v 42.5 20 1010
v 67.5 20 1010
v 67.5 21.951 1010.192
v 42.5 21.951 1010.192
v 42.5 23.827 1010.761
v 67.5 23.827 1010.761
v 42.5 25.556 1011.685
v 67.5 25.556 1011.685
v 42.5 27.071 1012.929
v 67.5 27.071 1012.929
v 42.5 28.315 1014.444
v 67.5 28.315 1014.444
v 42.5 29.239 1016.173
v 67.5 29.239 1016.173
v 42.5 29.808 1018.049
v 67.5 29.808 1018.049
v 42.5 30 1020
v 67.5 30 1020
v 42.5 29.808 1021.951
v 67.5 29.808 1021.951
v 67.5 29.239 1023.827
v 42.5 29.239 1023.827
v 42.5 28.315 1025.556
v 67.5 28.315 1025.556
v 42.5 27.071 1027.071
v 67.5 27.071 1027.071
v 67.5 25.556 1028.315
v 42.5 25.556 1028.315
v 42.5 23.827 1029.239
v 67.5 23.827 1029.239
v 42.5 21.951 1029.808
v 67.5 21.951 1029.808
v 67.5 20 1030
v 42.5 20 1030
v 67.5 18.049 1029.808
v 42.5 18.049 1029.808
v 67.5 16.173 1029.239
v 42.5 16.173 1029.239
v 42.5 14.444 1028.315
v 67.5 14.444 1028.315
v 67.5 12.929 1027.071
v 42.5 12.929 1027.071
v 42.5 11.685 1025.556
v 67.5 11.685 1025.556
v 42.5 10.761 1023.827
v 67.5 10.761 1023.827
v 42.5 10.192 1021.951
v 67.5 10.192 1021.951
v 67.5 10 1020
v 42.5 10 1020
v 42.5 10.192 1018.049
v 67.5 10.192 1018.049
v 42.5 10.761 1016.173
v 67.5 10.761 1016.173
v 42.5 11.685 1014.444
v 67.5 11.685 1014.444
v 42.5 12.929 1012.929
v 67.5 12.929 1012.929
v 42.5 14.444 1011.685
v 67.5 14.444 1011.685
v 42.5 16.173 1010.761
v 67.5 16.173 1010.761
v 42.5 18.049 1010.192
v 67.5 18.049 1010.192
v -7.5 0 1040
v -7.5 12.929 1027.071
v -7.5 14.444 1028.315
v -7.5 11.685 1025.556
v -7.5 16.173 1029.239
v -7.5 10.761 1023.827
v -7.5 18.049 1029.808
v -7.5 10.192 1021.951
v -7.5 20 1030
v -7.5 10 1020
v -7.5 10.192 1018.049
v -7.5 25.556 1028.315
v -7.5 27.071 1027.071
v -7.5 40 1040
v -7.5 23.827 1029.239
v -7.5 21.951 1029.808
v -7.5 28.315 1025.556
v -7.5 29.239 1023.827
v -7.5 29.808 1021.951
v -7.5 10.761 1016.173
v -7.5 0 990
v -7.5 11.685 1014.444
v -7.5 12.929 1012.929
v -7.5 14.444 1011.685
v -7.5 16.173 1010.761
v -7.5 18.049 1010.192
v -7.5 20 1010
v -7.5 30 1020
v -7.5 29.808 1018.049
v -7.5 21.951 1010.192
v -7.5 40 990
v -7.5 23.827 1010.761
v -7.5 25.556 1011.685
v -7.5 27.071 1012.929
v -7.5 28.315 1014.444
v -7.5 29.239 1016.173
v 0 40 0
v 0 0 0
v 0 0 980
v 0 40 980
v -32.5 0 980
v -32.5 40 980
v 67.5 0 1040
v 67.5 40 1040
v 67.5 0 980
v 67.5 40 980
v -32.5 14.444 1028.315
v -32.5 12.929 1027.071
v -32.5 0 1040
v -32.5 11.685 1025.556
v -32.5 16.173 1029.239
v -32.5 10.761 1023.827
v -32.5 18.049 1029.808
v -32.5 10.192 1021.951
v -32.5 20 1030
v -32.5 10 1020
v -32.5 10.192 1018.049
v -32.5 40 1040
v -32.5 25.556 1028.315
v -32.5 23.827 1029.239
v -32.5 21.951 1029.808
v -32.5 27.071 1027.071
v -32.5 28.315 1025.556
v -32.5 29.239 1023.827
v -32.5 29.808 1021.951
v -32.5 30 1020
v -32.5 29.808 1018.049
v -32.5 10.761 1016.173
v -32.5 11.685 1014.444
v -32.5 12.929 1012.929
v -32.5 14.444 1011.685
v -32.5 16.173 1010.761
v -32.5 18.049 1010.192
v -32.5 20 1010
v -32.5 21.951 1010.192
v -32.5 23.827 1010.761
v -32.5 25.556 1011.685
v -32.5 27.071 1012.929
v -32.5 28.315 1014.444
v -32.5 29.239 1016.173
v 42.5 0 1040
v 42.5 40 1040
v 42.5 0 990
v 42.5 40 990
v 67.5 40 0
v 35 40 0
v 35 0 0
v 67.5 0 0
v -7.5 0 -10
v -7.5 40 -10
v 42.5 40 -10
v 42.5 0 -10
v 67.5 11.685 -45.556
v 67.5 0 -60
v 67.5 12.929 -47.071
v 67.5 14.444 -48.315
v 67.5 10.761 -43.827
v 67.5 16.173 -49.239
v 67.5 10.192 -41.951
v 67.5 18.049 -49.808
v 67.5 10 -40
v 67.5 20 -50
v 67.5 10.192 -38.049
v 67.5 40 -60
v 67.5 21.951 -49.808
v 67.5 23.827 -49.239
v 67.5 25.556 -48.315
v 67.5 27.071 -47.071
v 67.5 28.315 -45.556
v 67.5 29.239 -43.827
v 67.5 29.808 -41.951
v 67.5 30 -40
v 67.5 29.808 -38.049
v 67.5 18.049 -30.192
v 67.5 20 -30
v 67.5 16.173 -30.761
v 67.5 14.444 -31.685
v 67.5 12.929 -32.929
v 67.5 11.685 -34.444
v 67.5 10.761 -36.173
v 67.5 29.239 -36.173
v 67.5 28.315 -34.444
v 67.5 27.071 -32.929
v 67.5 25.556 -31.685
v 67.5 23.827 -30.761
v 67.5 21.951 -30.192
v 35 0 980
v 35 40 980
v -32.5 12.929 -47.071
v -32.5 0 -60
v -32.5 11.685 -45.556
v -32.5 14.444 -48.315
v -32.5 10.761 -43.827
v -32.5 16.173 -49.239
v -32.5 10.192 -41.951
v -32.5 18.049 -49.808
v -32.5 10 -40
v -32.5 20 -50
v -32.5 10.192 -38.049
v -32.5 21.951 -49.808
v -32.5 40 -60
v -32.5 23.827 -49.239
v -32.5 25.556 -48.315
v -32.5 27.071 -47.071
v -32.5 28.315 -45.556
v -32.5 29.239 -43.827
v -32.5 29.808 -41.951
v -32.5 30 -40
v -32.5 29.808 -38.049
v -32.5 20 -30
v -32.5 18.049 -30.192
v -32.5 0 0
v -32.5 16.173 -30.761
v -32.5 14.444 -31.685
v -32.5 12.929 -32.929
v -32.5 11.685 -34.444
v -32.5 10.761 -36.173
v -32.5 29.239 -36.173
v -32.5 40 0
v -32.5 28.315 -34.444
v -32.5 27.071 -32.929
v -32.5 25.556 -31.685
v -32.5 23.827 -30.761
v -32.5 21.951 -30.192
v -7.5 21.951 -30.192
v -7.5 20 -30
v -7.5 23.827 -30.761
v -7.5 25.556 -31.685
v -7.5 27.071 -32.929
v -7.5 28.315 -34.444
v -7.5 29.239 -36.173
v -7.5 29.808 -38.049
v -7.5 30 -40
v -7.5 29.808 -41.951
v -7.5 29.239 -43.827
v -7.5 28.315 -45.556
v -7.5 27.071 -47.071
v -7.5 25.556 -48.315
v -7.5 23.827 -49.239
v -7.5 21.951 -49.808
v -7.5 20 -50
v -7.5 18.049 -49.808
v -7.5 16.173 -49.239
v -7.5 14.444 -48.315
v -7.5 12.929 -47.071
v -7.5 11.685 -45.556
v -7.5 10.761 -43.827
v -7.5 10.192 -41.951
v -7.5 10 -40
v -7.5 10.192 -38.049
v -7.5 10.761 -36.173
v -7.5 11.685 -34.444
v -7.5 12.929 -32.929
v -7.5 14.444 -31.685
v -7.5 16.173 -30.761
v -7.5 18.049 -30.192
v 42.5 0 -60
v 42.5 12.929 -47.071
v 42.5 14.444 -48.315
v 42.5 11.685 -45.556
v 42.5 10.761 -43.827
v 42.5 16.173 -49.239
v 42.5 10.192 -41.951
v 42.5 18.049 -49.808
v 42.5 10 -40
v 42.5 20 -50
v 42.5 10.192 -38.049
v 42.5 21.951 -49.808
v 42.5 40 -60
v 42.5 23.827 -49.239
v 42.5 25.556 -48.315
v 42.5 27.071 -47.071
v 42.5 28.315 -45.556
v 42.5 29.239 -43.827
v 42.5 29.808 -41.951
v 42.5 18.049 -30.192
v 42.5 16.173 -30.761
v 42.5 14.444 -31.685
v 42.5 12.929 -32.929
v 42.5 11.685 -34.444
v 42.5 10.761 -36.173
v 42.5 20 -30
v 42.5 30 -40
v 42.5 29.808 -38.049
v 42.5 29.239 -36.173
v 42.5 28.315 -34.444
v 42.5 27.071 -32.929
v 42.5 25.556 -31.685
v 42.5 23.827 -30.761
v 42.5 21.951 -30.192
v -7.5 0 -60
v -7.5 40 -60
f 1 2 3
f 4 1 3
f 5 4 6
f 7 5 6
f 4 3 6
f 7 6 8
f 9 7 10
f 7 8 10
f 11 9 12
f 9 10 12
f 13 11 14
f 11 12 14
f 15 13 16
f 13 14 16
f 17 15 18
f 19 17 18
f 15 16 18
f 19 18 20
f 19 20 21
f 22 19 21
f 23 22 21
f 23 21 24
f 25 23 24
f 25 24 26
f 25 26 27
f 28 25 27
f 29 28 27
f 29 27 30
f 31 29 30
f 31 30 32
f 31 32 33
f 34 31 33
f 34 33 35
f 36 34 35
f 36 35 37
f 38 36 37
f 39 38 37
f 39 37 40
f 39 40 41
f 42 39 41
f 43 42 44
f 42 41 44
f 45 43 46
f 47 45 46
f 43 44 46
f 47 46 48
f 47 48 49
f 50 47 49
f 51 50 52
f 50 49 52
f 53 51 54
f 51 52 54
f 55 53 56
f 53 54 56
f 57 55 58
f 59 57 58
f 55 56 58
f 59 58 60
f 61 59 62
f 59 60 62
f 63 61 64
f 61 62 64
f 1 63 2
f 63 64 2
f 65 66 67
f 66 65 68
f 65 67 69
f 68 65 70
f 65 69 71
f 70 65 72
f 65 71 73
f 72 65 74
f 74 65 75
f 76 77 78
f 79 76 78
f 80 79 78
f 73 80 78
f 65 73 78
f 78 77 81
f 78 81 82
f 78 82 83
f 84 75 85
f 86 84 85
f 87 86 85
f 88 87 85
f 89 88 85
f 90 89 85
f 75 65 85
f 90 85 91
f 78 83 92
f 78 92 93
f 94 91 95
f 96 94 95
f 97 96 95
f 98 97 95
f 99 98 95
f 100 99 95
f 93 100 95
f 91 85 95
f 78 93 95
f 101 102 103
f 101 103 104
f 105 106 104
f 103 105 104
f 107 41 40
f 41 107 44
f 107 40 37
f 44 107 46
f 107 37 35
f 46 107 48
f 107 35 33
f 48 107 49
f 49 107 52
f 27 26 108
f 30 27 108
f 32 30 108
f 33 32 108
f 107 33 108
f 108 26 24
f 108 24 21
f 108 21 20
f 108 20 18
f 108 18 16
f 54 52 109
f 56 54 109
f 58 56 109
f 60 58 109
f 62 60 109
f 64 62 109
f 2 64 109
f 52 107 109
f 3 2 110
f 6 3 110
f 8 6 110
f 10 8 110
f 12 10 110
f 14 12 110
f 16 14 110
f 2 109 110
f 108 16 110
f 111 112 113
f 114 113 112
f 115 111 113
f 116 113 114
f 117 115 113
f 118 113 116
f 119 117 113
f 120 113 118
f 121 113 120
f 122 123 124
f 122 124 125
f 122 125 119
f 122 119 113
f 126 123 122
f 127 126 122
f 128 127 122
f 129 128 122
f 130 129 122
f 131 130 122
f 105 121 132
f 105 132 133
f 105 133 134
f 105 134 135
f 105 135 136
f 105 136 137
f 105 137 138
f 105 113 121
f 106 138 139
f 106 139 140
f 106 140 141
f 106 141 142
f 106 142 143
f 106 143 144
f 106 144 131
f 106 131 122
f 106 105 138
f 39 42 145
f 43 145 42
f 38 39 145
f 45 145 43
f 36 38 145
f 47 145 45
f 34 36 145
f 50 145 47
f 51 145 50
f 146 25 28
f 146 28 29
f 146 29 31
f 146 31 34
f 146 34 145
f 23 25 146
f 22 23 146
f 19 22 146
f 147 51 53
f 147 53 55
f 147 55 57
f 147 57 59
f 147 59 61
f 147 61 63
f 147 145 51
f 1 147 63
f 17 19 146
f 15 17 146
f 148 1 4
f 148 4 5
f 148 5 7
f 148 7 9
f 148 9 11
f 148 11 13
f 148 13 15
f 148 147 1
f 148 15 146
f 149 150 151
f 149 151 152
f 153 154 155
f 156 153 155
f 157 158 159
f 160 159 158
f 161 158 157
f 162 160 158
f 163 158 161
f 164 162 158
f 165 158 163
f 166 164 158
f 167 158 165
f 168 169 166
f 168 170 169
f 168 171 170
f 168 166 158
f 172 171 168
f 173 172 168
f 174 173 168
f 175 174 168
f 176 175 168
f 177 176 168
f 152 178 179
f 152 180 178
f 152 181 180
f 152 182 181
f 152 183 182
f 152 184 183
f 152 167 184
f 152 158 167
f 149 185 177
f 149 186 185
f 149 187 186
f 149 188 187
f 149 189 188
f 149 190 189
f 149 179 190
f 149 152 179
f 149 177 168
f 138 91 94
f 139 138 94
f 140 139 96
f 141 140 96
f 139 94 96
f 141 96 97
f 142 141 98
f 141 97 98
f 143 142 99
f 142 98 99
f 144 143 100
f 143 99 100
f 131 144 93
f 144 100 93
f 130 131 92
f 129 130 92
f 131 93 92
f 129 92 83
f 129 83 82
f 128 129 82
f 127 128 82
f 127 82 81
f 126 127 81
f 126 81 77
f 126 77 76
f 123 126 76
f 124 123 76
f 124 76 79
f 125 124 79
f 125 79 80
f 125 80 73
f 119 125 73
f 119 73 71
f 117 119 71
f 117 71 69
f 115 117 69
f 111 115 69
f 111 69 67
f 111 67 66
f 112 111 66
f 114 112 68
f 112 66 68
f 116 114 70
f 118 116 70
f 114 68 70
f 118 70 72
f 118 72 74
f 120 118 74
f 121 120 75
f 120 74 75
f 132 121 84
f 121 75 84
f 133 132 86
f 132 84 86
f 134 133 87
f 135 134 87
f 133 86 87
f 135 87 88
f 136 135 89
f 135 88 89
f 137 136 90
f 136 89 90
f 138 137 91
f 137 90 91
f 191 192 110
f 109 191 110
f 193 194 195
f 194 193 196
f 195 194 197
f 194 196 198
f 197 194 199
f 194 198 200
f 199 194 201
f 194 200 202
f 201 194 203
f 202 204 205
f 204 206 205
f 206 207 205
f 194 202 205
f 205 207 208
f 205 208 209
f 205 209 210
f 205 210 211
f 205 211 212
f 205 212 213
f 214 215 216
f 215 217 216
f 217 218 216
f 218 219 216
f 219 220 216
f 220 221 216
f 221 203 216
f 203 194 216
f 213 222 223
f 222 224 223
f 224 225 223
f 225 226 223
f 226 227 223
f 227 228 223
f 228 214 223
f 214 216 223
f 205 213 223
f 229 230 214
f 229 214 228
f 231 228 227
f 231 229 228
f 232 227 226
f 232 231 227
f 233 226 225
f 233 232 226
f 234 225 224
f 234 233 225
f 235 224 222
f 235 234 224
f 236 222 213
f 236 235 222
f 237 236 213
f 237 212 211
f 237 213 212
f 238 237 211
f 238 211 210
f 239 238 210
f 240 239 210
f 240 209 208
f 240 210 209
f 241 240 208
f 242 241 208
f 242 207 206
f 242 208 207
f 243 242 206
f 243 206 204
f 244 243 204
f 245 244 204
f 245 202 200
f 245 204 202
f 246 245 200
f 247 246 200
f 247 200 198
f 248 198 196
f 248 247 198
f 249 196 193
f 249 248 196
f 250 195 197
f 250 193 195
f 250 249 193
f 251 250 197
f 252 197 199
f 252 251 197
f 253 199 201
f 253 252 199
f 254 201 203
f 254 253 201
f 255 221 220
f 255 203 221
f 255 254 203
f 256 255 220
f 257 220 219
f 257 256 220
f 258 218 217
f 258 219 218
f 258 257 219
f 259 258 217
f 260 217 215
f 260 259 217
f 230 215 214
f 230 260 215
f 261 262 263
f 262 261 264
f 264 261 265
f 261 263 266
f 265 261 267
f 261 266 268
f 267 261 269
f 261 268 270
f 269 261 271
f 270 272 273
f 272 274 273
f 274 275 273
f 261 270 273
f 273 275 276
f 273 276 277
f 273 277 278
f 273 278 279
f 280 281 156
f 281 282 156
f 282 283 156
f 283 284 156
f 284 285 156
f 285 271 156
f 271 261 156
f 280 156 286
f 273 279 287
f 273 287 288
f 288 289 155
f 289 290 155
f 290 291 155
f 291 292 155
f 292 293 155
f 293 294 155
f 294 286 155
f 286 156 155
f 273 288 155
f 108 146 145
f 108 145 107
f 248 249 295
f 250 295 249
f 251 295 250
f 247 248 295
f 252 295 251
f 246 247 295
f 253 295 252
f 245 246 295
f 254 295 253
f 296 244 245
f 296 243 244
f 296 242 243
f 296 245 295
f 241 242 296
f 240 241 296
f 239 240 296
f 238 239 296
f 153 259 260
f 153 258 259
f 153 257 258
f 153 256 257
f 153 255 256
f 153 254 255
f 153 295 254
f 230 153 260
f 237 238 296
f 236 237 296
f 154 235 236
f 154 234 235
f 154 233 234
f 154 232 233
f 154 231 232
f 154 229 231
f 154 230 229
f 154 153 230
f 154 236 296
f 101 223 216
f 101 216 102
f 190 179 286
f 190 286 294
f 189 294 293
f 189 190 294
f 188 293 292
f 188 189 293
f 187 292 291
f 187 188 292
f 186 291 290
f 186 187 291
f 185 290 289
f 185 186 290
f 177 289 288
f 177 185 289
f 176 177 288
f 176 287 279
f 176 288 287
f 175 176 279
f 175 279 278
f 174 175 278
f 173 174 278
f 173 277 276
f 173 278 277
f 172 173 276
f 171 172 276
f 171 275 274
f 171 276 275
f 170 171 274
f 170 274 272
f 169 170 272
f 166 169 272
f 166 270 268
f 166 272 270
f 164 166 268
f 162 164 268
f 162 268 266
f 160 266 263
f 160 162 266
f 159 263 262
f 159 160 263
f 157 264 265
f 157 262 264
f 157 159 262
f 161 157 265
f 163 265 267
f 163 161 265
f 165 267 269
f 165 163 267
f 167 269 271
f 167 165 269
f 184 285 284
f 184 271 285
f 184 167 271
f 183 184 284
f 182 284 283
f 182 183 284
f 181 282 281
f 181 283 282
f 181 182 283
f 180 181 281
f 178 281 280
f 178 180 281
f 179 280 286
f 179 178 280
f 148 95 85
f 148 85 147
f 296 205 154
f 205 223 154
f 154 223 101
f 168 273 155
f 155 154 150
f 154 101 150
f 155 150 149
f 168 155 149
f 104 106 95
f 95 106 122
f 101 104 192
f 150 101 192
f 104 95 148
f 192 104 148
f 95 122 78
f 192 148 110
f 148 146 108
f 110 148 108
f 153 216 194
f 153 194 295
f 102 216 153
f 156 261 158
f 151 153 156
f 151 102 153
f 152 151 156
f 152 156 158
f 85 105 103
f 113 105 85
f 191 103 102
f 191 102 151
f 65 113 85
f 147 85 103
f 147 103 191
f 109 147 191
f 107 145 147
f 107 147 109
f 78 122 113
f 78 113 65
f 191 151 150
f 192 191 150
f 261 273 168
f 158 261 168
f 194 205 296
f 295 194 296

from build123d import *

# Parameters (mm, degrees)
SZKIC1_W                    = 35
SZKIC1_H                    = 40
DODANIE_WYCI_GNI_CIE1_DEPTH = 980
SZKIC2_W                    = 100
SZKIC2_H                    = 40
DODANIE_WYCI_GNI_CIE2_DEPTH = 10
SZKIC3_W                    = 25
SZKIC3_H                    = 40
DODANIE_WYCI_GNI_CIE3_DEPTH = 50
SZKIC4_R                    = 10
WYTNIJ_WYCI_GNI_CIE3_DEPTH  = 1060.811303959


with BuildPart() as part:
    # Szkic1 → Dodanie-wyciągnięcie1 (new body)
    with BuildSketch(Plane.XY):
        with Locations((17.5, 20)):
            Rectangle(SZKIC1_W, SZKIC1_H)
    extrude(amount=DODANIE_WYCI_GNI_CIE1_DEPTH)

    # Szkic2 → Dodanie-wyciągnięcie2 (add)
    with BuildSketch(Plane.XY.offset(980)):
        with Locations((17.5, 20)):
            Rectangle(SZKIC2_W, SZKIC2_H)
    dodanie_wyci_gni_cie2 = extrude(amount=DODANIE_WYCI_GNI_CIE2_DEPTH)

    # Szkic3 → Dodanie-wyciągnięcie3 (add)
    with BuildSketch(Plane.XY.offset(990)):
        with Locations((-20, 20)):
            Rectangle(SZKIC3_W, SZKIC3_H)
        with Locations((55, 20)):
            Rectangle(SZKIC3_W, SZKIC3_H)
    dodanie_wyci_gni_cie3 = extrude(amount=DODANIE_WYCI_GNI_CIE3_DEPTH)

    # Szkic4 → Wytnij-wyciągnięcie3 (cut, through all)
    with BuildSketch(Plane(origin=(167.5, 0, 0), x_dir=(0, 0, -1), z_dir=(1, 0, 0))):
        with Locations((-1020, 20)):
            Circle(SZKIC4_R)
    wytnij_wyci_gni_cie3 = extrude(amount=-WYTNIJ_WYCI_GNI_CIE3_DEPTH, mode=Mode.SUBTRACT)

    # Lustro1: Dodanie-wyciągnięcie2, Dodanie-wyciągnięcie3, Wytnij-wyciągnięcie3 across plane
    add(dodanie_wyci_gni_cie2.mirror(Plane(origin=(0, 0, 490), x_dir=(1, 0, 0), z_dir=(0, 0, -1))))
    add(dodanie_wyci_gni_cie3.mirror(Plane(origin=(0, 0, 490), x_dir=(1, 0, 0), z_dir=(0, 0, -1))))
    add(wytnij_wyci_gni_cie3.mirror(Plane(origin=(0, 0, 490), x_dir=(1, 0, 0), z_dir=(0, 0, -1))), mode=Mode.SUBTRACT)


solid = part.part
